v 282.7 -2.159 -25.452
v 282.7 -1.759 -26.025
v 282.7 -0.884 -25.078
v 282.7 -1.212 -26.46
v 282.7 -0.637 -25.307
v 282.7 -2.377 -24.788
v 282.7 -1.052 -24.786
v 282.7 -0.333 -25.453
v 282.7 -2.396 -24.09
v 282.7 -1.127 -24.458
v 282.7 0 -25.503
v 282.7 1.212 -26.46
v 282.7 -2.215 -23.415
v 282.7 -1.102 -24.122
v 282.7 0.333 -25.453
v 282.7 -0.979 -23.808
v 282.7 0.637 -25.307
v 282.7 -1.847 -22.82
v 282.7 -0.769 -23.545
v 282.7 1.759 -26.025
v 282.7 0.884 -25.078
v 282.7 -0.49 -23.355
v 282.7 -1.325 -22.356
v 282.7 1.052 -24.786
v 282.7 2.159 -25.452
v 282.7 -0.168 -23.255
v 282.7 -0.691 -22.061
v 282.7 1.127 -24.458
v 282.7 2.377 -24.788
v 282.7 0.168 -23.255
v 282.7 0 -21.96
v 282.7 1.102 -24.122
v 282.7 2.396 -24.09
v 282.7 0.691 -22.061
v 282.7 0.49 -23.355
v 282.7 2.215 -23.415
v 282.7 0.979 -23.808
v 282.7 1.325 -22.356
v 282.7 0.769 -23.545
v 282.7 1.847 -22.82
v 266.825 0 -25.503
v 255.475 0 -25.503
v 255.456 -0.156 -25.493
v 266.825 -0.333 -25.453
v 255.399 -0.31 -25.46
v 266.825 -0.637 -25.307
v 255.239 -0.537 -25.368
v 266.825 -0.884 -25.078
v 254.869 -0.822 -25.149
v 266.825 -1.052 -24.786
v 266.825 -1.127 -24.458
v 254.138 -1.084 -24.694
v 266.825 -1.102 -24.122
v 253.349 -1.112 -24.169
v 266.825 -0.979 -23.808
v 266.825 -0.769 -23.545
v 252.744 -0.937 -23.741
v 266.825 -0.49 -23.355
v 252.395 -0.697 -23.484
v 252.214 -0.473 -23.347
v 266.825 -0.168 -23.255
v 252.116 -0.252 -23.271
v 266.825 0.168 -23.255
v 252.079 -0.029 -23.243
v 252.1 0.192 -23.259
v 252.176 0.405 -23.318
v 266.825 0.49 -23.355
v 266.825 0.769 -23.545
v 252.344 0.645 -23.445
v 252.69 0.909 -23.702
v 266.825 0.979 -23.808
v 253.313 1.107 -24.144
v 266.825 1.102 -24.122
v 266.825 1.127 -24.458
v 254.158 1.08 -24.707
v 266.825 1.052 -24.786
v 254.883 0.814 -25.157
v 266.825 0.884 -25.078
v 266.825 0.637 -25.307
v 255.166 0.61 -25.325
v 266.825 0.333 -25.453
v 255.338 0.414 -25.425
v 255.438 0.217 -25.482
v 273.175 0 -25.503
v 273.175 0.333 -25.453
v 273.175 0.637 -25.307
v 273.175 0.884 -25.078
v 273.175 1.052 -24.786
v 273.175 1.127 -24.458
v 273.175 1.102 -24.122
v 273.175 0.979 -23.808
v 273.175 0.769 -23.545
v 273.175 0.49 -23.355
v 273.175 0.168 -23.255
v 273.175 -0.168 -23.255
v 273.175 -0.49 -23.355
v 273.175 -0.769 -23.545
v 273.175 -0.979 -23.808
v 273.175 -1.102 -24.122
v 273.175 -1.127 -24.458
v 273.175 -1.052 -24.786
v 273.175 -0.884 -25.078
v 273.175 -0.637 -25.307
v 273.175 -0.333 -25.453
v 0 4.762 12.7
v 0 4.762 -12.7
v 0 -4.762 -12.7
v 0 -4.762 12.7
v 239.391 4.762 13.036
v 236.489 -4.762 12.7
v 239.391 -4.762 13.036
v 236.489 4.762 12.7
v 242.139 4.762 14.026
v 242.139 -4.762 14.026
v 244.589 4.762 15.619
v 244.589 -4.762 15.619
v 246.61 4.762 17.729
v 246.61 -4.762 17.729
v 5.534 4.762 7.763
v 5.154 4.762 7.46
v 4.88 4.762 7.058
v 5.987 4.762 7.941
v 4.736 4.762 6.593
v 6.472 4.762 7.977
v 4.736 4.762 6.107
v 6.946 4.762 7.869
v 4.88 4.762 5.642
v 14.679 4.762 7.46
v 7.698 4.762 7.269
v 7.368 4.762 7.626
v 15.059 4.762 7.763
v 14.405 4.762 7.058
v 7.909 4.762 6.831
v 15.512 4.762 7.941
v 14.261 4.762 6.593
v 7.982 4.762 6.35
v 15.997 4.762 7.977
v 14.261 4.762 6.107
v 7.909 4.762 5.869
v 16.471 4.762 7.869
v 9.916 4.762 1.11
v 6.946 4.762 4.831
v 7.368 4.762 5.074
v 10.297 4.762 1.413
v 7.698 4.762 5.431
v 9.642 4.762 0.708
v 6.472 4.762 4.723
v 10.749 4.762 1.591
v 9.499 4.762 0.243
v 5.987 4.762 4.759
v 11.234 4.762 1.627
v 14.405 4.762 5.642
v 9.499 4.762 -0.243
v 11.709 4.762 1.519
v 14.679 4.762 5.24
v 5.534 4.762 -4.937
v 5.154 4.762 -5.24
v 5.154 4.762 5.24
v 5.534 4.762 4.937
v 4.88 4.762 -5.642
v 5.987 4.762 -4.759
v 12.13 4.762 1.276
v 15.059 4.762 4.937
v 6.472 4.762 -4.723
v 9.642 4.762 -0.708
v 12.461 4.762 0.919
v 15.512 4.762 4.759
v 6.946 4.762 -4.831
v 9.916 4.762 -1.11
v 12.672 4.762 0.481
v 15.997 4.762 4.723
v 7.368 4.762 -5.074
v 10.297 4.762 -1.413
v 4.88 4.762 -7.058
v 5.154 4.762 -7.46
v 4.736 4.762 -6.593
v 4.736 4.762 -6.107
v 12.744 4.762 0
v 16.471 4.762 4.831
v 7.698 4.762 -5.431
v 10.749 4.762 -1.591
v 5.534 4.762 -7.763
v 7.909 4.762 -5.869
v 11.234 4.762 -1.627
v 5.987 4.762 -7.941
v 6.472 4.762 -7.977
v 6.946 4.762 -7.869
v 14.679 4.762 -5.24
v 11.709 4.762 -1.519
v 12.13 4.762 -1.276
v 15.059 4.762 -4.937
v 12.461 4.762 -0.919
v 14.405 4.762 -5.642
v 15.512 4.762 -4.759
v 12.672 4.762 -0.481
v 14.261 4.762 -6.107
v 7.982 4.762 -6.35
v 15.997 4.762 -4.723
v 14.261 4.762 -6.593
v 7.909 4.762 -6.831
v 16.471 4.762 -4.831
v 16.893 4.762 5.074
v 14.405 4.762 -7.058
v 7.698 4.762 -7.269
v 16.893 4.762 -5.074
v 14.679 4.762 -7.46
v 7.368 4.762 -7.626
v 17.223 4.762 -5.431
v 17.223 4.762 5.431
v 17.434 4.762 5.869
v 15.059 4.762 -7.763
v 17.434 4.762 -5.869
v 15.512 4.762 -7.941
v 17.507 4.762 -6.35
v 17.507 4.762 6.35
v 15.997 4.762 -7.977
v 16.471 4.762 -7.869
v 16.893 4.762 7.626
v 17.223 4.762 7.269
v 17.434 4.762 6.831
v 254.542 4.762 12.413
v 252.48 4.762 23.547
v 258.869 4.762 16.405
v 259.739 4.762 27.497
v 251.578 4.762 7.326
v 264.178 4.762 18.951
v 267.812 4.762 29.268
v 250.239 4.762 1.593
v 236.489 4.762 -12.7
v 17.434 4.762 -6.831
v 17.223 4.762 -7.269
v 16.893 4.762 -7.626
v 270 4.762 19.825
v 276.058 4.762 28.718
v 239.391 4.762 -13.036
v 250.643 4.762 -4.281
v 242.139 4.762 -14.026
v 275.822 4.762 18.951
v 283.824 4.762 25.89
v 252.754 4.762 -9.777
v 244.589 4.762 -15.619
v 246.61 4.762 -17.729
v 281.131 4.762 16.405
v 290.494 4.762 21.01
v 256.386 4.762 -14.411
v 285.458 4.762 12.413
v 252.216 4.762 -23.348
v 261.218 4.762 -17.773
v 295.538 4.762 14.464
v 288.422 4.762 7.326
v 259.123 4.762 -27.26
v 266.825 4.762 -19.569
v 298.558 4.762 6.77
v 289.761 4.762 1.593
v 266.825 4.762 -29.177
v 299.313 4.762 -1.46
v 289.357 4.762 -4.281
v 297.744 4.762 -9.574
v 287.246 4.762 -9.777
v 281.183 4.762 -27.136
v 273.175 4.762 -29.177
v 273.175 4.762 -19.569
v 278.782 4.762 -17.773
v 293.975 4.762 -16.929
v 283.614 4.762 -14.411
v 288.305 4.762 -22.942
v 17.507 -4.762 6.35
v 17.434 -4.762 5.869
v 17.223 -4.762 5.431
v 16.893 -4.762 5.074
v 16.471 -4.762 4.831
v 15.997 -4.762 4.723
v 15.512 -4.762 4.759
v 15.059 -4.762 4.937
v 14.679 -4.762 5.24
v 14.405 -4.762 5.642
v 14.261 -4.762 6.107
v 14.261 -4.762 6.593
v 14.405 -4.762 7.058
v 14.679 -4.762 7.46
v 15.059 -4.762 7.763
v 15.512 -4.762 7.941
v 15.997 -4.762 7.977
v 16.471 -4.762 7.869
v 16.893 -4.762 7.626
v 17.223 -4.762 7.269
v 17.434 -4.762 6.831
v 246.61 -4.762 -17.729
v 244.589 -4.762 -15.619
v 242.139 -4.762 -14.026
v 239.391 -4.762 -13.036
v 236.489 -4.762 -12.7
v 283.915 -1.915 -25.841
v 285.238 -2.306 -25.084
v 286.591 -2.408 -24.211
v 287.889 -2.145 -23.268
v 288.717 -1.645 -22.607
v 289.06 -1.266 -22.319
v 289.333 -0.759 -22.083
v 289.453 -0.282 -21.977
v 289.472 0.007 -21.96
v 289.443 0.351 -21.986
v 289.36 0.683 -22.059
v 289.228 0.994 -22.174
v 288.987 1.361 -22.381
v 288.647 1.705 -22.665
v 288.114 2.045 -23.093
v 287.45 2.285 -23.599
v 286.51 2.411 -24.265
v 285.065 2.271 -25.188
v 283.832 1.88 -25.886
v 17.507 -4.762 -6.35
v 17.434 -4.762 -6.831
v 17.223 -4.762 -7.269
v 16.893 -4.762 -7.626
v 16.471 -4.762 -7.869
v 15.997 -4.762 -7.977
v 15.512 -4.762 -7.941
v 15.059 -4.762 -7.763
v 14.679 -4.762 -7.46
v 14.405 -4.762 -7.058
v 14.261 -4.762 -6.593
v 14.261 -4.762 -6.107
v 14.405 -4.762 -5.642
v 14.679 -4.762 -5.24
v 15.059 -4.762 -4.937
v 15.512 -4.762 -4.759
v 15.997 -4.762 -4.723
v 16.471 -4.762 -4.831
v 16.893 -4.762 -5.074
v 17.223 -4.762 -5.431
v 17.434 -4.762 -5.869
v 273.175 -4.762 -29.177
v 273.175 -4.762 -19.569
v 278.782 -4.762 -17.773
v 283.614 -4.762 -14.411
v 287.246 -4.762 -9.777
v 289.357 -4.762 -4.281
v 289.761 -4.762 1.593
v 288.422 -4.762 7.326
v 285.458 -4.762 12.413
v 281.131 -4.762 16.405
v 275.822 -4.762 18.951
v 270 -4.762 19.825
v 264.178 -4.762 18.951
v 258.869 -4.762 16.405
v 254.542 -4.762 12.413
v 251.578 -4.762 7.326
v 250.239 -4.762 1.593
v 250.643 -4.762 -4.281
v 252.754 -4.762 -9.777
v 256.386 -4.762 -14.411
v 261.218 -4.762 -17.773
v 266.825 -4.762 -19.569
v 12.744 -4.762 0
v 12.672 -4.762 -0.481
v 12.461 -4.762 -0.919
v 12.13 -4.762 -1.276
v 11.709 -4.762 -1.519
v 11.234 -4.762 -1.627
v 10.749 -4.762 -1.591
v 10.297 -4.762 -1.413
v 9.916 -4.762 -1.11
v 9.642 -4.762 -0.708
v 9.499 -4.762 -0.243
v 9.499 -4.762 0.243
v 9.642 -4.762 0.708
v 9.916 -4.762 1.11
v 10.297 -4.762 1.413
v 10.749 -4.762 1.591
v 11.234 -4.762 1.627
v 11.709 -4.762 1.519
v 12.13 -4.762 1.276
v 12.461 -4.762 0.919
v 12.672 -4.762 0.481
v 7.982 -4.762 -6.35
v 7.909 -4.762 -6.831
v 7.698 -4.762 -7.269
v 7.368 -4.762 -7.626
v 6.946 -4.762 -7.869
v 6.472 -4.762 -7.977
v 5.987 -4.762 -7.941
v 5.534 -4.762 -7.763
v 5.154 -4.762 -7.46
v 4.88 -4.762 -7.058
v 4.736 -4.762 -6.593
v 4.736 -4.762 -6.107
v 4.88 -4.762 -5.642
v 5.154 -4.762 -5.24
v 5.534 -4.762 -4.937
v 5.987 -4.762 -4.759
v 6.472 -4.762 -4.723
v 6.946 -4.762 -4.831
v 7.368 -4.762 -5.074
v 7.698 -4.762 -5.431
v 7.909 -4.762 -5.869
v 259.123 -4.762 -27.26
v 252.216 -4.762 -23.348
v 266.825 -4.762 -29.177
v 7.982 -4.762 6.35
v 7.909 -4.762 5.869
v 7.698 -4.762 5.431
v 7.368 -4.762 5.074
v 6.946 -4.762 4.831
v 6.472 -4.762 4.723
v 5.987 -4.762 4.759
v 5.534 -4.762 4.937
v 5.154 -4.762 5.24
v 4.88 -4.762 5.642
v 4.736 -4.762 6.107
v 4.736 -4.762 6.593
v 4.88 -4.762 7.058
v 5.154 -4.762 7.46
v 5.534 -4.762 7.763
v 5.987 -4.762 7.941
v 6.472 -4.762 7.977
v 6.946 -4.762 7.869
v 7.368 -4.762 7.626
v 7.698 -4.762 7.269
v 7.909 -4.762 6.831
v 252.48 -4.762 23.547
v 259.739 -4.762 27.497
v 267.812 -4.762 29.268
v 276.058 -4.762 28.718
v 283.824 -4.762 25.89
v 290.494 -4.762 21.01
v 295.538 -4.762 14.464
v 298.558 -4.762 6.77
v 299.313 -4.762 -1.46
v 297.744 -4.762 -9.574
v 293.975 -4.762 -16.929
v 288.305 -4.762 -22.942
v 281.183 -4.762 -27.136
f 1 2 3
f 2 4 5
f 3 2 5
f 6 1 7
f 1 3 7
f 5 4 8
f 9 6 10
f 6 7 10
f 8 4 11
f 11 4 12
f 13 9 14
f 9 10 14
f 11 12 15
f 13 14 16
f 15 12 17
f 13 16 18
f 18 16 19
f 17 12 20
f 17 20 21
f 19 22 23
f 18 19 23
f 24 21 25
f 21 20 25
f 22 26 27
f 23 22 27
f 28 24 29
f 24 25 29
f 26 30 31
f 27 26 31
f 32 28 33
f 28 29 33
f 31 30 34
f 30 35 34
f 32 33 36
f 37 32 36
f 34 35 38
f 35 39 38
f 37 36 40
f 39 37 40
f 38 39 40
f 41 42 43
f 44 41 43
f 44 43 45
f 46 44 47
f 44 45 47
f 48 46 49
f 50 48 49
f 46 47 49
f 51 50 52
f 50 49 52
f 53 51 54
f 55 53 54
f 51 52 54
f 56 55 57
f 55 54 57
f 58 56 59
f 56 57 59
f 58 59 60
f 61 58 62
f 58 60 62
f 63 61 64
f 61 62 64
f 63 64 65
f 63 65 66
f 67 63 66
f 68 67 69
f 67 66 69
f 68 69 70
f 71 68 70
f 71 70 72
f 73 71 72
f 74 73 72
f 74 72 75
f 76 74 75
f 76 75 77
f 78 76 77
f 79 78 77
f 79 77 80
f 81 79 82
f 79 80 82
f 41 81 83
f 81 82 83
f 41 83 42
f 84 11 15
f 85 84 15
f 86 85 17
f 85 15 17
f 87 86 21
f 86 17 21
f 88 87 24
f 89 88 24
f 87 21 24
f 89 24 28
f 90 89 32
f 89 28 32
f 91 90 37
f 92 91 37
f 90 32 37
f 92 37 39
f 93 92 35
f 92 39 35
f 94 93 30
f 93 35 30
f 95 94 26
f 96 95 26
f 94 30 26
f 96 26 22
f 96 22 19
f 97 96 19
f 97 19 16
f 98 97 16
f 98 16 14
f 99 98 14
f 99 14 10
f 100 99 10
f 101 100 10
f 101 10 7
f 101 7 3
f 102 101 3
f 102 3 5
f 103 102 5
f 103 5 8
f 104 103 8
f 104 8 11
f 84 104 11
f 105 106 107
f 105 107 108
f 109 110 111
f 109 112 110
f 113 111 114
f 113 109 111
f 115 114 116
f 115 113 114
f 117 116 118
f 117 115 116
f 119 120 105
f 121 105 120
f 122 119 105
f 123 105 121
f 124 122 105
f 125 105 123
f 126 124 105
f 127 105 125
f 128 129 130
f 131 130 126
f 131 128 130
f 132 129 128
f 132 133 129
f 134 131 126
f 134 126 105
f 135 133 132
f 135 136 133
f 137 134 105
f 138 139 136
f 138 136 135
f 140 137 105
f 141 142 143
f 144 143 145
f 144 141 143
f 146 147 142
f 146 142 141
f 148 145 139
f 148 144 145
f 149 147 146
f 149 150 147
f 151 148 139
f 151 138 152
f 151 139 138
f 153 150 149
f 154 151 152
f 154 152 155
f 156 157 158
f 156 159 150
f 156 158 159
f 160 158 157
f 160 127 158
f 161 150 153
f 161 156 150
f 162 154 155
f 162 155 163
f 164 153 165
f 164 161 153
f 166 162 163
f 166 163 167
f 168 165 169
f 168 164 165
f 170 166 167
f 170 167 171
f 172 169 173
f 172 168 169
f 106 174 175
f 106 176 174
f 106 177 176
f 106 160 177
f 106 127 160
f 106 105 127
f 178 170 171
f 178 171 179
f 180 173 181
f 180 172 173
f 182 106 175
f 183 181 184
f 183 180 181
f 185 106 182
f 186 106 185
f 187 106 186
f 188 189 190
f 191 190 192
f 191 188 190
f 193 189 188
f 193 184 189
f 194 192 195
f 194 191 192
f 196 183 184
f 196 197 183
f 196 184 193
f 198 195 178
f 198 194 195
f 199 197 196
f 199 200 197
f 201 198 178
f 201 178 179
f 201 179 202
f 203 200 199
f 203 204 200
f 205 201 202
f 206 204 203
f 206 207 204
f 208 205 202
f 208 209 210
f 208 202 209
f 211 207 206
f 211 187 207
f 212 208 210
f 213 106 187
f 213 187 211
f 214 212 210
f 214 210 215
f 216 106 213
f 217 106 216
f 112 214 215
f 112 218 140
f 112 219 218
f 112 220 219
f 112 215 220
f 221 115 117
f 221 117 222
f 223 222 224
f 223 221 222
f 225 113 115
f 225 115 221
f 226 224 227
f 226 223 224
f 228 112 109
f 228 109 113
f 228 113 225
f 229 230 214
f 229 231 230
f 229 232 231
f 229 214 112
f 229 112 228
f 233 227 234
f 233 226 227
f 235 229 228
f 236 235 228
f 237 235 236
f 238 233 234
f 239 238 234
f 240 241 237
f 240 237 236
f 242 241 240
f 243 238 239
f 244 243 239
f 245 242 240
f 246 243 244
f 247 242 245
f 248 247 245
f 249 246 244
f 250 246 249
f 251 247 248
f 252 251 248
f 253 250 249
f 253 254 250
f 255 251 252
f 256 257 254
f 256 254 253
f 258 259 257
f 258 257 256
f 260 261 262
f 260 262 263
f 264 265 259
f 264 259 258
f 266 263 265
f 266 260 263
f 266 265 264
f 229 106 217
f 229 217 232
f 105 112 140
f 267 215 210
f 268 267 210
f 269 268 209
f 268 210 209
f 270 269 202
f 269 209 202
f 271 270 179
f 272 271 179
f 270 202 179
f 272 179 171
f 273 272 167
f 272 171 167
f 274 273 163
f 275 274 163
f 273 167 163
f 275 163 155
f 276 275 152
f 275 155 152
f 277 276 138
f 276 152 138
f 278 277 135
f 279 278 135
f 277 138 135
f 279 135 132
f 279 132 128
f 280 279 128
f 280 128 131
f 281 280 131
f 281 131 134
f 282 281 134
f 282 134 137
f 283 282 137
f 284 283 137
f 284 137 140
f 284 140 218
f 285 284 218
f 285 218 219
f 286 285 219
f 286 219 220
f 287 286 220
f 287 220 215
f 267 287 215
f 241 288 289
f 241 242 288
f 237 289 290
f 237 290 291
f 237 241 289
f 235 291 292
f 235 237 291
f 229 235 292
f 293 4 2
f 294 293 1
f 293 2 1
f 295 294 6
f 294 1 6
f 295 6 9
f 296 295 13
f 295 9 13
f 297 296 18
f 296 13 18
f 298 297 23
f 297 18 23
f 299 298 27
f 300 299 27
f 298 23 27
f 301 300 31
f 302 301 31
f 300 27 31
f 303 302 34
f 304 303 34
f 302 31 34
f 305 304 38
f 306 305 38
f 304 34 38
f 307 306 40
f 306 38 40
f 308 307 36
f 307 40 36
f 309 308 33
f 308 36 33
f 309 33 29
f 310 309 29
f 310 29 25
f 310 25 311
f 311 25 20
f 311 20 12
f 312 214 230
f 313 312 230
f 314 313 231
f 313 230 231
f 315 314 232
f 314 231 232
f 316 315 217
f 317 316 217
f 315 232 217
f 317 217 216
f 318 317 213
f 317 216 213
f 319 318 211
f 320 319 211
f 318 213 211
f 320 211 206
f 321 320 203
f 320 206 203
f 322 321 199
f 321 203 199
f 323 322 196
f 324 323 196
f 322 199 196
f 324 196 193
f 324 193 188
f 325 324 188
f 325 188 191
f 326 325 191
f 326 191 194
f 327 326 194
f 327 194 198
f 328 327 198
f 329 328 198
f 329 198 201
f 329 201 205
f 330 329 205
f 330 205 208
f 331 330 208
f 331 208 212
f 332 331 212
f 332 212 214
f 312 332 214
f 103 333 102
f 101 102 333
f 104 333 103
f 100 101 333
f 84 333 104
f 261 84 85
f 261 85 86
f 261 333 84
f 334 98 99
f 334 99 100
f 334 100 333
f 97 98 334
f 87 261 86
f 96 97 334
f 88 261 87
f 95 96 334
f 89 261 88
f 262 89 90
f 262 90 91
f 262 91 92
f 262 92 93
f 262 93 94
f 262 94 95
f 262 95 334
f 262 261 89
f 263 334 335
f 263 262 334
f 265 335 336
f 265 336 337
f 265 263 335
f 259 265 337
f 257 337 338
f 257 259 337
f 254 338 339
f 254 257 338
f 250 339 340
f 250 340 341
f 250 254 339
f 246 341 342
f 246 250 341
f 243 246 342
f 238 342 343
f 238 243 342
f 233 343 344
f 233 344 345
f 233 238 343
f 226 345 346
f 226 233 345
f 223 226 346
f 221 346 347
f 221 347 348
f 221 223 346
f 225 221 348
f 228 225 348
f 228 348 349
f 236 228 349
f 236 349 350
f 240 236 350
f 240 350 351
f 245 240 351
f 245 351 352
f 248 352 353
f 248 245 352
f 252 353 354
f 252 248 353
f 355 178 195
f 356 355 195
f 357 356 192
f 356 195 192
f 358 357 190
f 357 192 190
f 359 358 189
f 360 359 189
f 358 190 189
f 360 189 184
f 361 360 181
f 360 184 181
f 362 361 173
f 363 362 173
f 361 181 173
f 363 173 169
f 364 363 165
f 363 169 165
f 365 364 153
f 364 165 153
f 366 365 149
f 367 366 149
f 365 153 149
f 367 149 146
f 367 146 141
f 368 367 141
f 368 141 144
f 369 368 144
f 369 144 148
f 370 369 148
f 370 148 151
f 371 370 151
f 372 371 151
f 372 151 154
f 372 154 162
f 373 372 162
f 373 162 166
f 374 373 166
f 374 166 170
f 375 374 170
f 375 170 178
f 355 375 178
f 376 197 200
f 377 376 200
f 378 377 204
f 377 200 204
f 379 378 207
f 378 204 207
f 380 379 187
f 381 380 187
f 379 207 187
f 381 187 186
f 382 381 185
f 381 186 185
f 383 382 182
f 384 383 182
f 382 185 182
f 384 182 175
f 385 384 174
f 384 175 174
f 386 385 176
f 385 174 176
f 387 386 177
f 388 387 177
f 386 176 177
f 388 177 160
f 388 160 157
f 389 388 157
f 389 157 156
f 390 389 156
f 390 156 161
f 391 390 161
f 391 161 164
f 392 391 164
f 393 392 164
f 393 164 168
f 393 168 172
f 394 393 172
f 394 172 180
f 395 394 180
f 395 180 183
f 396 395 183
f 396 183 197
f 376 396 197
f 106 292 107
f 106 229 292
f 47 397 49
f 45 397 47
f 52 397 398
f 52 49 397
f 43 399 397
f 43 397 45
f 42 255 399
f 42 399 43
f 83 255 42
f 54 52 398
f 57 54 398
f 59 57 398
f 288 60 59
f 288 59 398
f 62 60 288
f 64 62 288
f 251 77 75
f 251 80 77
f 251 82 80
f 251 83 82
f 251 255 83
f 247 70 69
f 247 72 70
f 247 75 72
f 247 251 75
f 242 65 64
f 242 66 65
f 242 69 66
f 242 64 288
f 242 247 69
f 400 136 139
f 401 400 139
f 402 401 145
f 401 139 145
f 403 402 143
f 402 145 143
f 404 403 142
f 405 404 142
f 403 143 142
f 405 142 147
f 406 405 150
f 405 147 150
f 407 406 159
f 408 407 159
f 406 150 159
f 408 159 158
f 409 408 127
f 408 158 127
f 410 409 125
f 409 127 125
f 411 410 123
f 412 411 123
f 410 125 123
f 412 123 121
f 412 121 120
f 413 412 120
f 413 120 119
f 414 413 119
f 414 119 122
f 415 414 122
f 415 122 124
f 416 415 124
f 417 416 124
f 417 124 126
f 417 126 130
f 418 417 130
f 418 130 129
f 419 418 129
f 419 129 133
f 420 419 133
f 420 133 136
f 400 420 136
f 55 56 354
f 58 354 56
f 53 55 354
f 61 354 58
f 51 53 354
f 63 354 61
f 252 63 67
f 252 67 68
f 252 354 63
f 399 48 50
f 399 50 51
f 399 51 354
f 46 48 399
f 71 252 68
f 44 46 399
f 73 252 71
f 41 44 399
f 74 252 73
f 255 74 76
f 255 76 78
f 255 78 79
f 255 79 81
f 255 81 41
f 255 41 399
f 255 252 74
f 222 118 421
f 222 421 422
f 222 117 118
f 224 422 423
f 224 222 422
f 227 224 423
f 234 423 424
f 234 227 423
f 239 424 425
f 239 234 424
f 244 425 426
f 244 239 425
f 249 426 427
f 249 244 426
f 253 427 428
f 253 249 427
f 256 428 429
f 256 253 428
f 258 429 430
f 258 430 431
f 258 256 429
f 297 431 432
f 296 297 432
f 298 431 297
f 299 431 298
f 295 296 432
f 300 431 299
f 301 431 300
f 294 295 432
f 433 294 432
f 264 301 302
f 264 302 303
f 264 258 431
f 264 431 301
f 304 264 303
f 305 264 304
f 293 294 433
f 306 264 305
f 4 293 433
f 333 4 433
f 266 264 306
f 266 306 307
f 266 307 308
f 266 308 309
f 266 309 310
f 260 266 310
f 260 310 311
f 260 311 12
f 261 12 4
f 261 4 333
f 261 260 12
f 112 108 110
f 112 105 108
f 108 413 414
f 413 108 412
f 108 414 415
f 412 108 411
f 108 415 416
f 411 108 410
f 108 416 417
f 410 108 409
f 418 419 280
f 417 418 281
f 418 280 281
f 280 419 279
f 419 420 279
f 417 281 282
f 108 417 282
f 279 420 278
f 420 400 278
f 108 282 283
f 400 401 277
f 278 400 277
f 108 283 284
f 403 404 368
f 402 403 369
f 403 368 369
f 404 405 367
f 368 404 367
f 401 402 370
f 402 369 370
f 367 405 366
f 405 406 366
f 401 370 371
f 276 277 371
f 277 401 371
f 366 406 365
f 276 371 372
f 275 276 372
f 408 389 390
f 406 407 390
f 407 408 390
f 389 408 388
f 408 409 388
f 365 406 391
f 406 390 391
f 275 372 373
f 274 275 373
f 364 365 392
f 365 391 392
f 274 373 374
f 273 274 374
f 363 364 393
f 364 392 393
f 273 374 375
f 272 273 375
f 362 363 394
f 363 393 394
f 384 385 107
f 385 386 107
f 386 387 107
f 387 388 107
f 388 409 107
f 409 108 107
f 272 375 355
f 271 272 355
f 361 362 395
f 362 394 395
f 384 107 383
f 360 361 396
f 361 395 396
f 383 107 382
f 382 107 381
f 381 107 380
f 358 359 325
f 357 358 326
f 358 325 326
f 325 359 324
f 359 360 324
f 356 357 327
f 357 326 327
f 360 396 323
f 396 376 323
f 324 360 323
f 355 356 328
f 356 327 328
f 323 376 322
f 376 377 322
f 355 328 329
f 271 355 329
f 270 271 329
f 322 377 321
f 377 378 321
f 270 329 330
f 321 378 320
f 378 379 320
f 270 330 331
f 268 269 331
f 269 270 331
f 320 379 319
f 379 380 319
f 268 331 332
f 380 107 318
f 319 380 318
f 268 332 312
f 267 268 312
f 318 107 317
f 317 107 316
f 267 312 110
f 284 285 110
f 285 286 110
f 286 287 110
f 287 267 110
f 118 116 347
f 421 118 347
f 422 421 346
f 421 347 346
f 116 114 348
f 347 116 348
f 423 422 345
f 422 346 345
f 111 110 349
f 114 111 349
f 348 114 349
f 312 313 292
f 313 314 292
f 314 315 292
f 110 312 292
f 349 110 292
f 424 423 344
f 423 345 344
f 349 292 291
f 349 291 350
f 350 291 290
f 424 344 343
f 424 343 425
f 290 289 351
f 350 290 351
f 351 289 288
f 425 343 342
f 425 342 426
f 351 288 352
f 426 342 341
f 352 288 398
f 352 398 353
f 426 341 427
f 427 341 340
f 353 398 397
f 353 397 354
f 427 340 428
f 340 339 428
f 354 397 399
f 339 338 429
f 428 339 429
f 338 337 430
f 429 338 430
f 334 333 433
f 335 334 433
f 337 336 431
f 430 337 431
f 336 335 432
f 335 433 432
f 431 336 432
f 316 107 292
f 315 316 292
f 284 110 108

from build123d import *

# Parameters (mm, degrees)
BOSS_EXTRUDE1_DEPTH   = 4.7625
SKETCH8_W             = 1.1303
SKETCH8_H             = 266.825
F_4_40_TAPPED_HOLE2_D = 2.2606
FILLET2_R             = 12.7
CUT_EXTRUDE1_START    = -9.525
SKETCH11_R            = 2.413
CUT_EXTRUDE1_DEPTH    = 17.6497001
F_4_CLEARANCE_HOLE1_D = 3.2639


with BuildPart() as part:
    # Sketch2 → Boss-Extrude1 (new body, symmetric)
    with BuildSketch(Plane(origin=(0, 0, 0), x_dir=(1, 0, 0), z_dir=(0, 1, 0))):
        with BuildLine():
            Line((266.825, 19.568804386), (266.825, 29.177461594))
            ThreePointArc((266.825, 29.177461594), (253.046230135, 23.957766537), (243.54031576, 12.7))
            Line((243.54031576, 12.7), (0, 12.7))
            Line((0, 12.7), (0, -12.7))
            Line((0, -12.7), (243.54031576, -12.7))
            ThreePointArc((243.54031576, -12.7), (293.957766537, -16.953769865), (273.175, 29.177461594))
            Line((273.175, 29.177461594), (273.175, 19.568804386))
            ThreePointArc((273.175, 19.568804386), (270, -19.8247), (266.825, 19.568804386))
        make_face()
    extrude(amount=BOSS_EXTRUDE1_DEPTH, both=True)

    # Sketch8 → #4-40 Tapped Hole1 (revolve, cut)
    with BuildSketch(Plane(origin=(266.825, 0, -24.37313299), x_dir=(0, 0, -1), z_dir=(0, 1, 0))):
        with Locations((0.56515, 133.4125)):
            Rectangle(SKETCH8_W, SKETCH8_H)
    revolve(axis=Axis((273.175, 0, -24.37313299), (-1, 0, 0)), mode=Mode.SUBTRACT)

    # #4-40 Tapped Hole2 (through all)
    with Locations(Plane.ZY.offset(-273.175)):
        with Locations((-24.37313299, 0)):
            Hole(F_4_40_TAPPED_HOLE2_D / 2)

    # Fillet2
    fillet2_edges = [part.edges().sort_by_distance(p)[0] for p in [
        (243.54031576, 0, -12.7),
        (243.54031576, 0, 12.7),
    ]]
    fillet(fillet2_edges, radius=FILLET2_R)

    # Sketch11 → Cut-Extrude1 (cut, through all)
    with BuildSketch(Plane.ZY.offset(-273.175).offset(CUT_EXTRUDE1_START)):
        with Locations((-24.37313299, 0)):
            Circle(SKETCH11_R)
    extrude(amount=-CUT_EXTRUDE1_DEPTH, mode=Mode.SUBTRACT)

    # #4 Clearance Hole1 (through all)
    with Locations(Plane(origin=(0, -4.7625, 0), x_dir=(-1, 0, 0), z_dir=(0, -1, 0))):
        with Locations((-6.35, -6.35), (-15.875, 6.35), (-15.875, -6.35), (-11.1125, 0), (-6.35, 6.35)):
            Hole(F_4_CLEARANCE_HOLE1_D / 2)


solid = part.part
